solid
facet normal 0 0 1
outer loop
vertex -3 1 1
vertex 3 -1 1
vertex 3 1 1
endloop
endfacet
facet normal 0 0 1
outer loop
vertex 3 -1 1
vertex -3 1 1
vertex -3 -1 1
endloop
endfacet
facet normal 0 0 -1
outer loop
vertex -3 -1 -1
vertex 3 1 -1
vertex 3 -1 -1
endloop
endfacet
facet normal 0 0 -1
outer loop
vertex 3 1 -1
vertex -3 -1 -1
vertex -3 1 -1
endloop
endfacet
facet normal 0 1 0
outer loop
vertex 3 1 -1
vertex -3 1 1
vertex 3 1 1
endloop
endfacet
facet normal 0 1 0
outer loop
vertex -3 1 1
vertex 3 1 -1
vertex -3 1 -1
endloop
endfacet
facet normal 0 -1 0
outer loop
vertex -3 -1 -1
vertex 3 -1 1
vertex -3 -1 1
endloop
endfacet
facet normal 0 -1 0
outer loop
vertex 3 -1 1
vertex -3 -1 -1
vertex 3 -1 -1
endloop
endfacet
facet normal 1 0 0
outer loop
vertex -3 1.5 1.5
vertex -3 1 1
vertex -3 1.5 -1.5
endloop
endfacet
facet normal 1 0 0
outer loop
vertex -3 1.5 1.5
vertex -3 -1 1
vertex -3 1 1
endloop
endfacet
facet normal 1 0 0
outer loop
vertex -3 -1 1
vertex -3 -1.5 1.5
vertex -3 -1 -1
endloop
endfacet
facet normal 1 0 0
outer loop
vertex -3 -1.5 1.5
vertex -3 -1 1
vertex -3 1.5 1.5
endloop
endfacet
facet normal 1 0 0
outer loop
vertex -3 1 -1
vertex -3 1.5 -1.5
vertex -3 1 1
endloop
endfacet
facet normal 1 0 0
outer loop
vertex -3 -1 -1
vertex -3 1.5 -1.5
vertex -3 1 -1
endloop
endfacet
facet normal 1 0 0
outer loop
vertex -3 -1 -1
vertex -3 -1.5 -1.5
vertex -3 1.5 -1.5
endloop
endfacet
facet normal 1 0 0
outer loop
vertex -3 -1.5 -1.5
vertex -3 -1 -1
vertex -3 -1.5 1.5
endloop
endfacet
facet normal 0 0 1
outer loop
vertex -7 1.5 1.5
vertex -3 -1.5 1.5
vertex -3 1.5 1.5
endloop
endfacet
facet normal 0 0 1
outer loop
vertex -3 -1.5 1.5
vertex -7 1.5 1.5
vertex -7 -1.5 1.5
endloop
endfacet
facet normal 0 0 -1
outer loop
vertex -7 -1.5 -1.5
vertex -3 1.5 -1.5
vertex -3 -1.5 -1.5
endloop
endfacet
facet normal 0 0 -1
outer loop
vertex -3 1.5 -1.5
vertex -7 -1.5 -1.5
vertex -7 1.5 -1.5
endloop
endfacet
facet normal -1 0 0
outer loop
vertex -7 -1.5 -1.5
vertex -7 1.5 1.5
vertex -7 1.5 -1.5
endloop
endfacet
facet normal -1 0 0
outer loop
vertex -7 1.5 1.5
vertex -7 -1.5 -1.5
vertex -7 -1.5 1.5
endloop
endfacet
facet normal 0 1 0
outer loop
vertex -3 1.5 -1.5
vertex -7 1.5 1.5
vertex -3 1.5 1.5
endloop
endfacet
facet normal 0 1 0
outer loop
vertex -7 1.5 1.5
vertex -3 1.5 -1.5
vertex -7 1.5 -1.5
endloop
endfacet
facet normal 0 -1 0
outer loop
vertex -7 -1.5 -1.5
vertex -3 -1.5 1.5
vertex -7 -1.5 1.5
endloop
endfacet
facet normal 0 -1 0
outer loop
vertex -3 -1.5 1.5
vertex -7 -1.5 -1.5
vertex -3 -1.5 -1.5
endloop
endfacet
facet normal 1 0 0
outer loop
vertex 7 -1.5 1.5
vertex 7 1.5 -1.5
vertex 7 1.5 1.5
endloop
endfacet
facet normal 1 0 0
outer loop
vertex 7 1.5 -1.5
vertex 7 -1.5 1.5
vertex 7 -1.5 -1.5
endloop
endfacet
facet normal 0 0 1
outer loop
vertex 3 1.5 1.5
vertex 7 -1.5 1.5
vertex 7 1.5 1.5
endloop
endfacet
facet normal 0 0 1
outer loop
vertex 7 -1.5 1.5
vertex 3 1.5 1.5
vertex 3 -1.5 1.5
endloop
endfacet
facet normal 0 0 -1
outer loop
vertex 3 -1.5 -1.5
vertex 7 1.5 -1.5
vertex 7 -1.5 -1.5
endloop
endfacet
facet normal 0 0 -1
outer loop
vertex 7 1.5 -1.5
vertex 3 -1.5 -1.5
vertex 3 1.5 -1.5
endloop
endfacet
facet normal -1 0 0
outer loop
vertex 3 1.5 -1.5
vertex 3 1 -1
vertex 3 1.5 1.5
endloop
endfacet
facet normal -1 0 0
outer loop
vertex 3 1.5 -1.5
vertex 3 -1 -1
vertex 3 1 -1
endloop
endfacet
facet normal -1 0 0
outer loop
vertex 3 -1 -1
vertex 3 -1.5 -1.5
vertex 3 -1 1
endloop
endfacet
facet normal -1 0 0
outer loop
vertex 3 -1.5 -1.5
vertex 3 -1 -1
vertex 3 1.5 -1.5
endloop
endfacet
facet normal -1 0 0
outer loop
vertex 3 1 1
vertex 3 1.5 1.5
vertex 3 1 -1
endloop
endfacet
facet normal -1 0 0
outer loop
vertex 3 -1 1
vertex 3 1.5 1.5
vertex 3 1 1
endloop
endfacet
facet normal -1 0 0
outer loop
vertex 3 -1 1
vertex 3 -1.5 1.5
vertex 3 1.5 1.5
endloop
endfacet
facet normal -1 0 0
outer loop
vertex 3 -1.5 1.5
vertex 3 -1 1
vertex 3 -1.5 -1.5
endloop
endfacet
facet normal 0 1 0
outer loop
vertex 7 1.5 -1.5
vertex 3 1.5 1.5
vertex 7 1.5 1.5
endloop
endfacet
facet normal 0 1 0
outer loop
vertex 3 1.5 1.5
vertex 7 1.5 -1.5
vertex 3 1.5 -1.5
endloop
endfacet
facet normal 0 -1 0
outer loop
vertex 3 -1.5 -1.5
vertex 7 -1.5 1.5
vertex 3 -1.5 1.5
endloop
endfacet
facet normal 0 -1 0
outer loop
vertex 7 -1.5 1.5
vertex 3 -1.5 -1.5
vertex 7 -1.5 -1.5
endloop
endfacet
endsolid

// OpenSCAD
// file: openscad2calculix.scad
/* When the openscad2calculix executable is running OpenSCAD, it will redefine
this to a different value. "preview" is only used in the interactive OpenSCAD
editor. */
__openscad2calculix_mode = ["preview"];

function __os2cx_is_string(arg) = (str(arg) == arg);
function __os2cx_is_number(arg) = (arg != undef) && (arg + 0 == arg);
function __os2cx_is_vector_3(arg) =
    len(arg) == 3
    && __os2cx_is_number(arg[0])
    && __os2cx_is_number(arg[1])
    && __os2cx_is_number(arg[2]);
function __os2cx_is_array_strings(arg) =
    [for (item = arg) if (!__os2cx_is_string(item)) false] == [];
function __os2cx_is_number_with_unit(arg) =
    len(arg) == 2
    && __os2cx_is_number(arg[0])
    && __os2cx_is_string(arg[1]);
function __os2cx_is_vector_3_with_unit(arg) =
    len(arg) == 2
    && __os2cx_is_vector_3(arg[0])
    && __os2cx_is_string(arg[1]);


module __os2cx_beacon() {
    origin_coords   = [0,   0,   0  ];
    concave_coords  = [0.1, 0.2, 0.3];
    corner_x_coords = [1,   0,   0  ];
    corner_y_coords = [0,   1,   0  ];
    corner_z_coords = [0,   0,   1  ];
    origin_id   = 0;
    concave_id  = 1;
    corner_x_id = 2;
    corner_y_id = 3;
    corner_z_id = 4;
    polyhedron(
        points = [
            origin_coords,
            concave_coords,
            corner_x_coords,
            corner_y_coords,
            corner_z_coords,
        ],
        faces = [
            [origin_id, corner_x_id, corner_y_id],
            [origin_id, corner_y_id, corner_z_id],
            [origin_id, corner_z_id, corner_x_id],
            [concave_id, corner_y_id, corner_x_id],
            [concave_id, corner_z_id, corner_y_id],
            [concave_id, corner_x_id, corner_z_id],
        ],
        convexity = 2
    );
}

module os2cx_analysis_custom(lines, unit_system=undef) {
    if (__openscad2calculix_mode == ["preview"]) {
        if (!__os2cx_is_array_strings(lines)) {
            echo("ERROR: os2cx_analysis_custom() parameter must be an " +
                "array of strings");
        }
        if (!__os2cx_is_array_strings(unit_system) || len(unit_system) != 3) {
            echo("ERROR: os2cx_analysis_custom() 'unit_system' parameter " +
                "must be an array of three strings.");
        }
    } else if (__openscad2calculix_mode == ["inventory"]) {
        echo("__openscad2calculix", "analysis_directive", lines, unit_system);
    }
}

module os2cx_mesh(name, max_tet_volume=undef) {
    if (__openscad2calculix_mode == ["preview"]) {
        if (!__os2cx_is_string(name)) {
            echo("ERROR: os2cx_mesh() name must be a string");
        }
        if (max_tet_volume != undef && !__os2cx_is_number(max_tet_volume)) {
            echo("ERROR: os2cx_mesh() max_tet_volume must be a number");
        }
        children();
    } else if (__openscad2calculix_mode == ["inventory"]) {
        echo("__openscad2calculix", "mesh_directive", name, max_tet_volume);
    } else if (__openscad2calculix_mode == ["mesh", name]) {
        children();
    }
}

module os2cx_select_volume(name) {
    if (__openscad2calculix_mode == ["preview"]) {
        if (!__os2cx_is_string(name)) {
            echo("ERROR: os2cx_select_volume() parameter must be a string");
        }
        # children();
    } else if (__openscad2calculix_mode == ["inventory"]) {
        echo("__openscad2calculix", "select_volume_directive", name);
    } else if (__openscad2calculix_mode == ["select_volume", name]) {
        children();
    }
}

module os2cx_select_surface(name, direction_vector, direction_angle_tolerance) {
    if (__openscad2calculix_mode == ["preview"]) {
        if (!__os2cx_is_string(name)) {
            echo("ERROR: os2cx_select_surface() parameter must be a string");
        }
        # children();
    } else if (__openscad2calculix_mode == ["inventory"]) {
        echo("__openscad2calculix", "select_surface_directive",
            name,
            direction_vector,
            direction_angle_tolerance);
    } else if (__openscad2calculix_mode == ["select_surface", name]) {
        children();
    }
}

module os2cx_load_volume(name, volume, force_per_volume) {
    if (__openscad2calculix_mode == ["preview"]) {
        if (!__os2cx_is_string(name)) {
            echo("ERROR: os2cx_load_volume() first parameter must be a string");
        }
        if (!__os2cx_is_string(volume)) {
            echo("ERROR: os2cx_load_volume() second parameter must be a string");
        }
        if (!__os2cx_is_vector_3_with_unit(force_per_volume)) {
            echo("ERROR: os2cx_load_volume() third parameter must be a " +
                "[vector, unit] pair.");
        }
        if ($children != 0) {
            echo("ERROR: os2cx_load_volume() shouldn't have any children");
        }
    } else if (__openscad2calculix_mode == ["inventory"]) {
        echo("__openscad2calculix", "load_volume_directive",
            name, volume, force_per_volume);
    }
}

module os2cx_load_surface(name, surface, force_per_area) {
    if (__openscad2calculix_mode == ["preview"]) {
        if (!__os2cx_is_string(name)) {
            echo("ERROR: os2cx_load_surface() first parameter must be a " +
                "string");
        }
        if (!__os2cx_is_string(surface)) {
            echo("ERROR: os2cx_load_surface() second parameter must be a " +
                "string");
        }
        if (!__os2cx_is_vector_3_with_unit(force_per_area)) {
            echo("ERROR: os2cx_load_surface() third parameter must be a " +
                "[vector, unit] pair.");
        }
        if ($children != 0) {
            echo("ERROR: os2cx_load_surface() shouldn't have any children");
        }
    } else if (__openscad2calculix_mode == ["inventory"]) {
        echo("__openscad2calculix", "load_surface_directive",
            name, surface, force_per_area);
    }
}
// main file
include <./openscad2calculix.scad>;

module cantilever() {
    cube([10, 2, 2], center=true);
}

os2cx_mesh("cantilever") cantilever();
os2cx_select_surface("fixed_end", [-1, 0, 0], 45) {
    translate([-5, 0, 0]) cube([4, 3, 3], center=true);
}
os2cx_select_surface("free_end", [1, 0, 0], 45) {
    translate([5, 0, 0]) cube([4, 3, 3], center=true);
}
os2cx_load_surface("load", "free_end", [[0, 0, -1000], "N/m^2"]);

os2cx_analysis_custom([
    "*INCLUDE, INPUT=cantilever.msh",
    "*INCLUDE, INPUT=fixed_end.nam",
    "*MATERIAL, Name=steel",
    "*ELASTIC",
    "209000000000, 0.3",
    "*SOLID SECTION, Elset=Ecantilever, Material=steel",
    "*STEP",
    "*STATIC",
    "*BOUNDARY",
    "Nfixed_end,1,3",
    "*CLOAD",
    "*INCLUDE, INPUT=load.clo",
    "*NODE FILE, Nset=Ncantilever",
    "U",
    "*EL FILE, Elset=Ecantilever",
    "S",
    "*END STEP"
], unit_system=["m", "kg", "s"]);
